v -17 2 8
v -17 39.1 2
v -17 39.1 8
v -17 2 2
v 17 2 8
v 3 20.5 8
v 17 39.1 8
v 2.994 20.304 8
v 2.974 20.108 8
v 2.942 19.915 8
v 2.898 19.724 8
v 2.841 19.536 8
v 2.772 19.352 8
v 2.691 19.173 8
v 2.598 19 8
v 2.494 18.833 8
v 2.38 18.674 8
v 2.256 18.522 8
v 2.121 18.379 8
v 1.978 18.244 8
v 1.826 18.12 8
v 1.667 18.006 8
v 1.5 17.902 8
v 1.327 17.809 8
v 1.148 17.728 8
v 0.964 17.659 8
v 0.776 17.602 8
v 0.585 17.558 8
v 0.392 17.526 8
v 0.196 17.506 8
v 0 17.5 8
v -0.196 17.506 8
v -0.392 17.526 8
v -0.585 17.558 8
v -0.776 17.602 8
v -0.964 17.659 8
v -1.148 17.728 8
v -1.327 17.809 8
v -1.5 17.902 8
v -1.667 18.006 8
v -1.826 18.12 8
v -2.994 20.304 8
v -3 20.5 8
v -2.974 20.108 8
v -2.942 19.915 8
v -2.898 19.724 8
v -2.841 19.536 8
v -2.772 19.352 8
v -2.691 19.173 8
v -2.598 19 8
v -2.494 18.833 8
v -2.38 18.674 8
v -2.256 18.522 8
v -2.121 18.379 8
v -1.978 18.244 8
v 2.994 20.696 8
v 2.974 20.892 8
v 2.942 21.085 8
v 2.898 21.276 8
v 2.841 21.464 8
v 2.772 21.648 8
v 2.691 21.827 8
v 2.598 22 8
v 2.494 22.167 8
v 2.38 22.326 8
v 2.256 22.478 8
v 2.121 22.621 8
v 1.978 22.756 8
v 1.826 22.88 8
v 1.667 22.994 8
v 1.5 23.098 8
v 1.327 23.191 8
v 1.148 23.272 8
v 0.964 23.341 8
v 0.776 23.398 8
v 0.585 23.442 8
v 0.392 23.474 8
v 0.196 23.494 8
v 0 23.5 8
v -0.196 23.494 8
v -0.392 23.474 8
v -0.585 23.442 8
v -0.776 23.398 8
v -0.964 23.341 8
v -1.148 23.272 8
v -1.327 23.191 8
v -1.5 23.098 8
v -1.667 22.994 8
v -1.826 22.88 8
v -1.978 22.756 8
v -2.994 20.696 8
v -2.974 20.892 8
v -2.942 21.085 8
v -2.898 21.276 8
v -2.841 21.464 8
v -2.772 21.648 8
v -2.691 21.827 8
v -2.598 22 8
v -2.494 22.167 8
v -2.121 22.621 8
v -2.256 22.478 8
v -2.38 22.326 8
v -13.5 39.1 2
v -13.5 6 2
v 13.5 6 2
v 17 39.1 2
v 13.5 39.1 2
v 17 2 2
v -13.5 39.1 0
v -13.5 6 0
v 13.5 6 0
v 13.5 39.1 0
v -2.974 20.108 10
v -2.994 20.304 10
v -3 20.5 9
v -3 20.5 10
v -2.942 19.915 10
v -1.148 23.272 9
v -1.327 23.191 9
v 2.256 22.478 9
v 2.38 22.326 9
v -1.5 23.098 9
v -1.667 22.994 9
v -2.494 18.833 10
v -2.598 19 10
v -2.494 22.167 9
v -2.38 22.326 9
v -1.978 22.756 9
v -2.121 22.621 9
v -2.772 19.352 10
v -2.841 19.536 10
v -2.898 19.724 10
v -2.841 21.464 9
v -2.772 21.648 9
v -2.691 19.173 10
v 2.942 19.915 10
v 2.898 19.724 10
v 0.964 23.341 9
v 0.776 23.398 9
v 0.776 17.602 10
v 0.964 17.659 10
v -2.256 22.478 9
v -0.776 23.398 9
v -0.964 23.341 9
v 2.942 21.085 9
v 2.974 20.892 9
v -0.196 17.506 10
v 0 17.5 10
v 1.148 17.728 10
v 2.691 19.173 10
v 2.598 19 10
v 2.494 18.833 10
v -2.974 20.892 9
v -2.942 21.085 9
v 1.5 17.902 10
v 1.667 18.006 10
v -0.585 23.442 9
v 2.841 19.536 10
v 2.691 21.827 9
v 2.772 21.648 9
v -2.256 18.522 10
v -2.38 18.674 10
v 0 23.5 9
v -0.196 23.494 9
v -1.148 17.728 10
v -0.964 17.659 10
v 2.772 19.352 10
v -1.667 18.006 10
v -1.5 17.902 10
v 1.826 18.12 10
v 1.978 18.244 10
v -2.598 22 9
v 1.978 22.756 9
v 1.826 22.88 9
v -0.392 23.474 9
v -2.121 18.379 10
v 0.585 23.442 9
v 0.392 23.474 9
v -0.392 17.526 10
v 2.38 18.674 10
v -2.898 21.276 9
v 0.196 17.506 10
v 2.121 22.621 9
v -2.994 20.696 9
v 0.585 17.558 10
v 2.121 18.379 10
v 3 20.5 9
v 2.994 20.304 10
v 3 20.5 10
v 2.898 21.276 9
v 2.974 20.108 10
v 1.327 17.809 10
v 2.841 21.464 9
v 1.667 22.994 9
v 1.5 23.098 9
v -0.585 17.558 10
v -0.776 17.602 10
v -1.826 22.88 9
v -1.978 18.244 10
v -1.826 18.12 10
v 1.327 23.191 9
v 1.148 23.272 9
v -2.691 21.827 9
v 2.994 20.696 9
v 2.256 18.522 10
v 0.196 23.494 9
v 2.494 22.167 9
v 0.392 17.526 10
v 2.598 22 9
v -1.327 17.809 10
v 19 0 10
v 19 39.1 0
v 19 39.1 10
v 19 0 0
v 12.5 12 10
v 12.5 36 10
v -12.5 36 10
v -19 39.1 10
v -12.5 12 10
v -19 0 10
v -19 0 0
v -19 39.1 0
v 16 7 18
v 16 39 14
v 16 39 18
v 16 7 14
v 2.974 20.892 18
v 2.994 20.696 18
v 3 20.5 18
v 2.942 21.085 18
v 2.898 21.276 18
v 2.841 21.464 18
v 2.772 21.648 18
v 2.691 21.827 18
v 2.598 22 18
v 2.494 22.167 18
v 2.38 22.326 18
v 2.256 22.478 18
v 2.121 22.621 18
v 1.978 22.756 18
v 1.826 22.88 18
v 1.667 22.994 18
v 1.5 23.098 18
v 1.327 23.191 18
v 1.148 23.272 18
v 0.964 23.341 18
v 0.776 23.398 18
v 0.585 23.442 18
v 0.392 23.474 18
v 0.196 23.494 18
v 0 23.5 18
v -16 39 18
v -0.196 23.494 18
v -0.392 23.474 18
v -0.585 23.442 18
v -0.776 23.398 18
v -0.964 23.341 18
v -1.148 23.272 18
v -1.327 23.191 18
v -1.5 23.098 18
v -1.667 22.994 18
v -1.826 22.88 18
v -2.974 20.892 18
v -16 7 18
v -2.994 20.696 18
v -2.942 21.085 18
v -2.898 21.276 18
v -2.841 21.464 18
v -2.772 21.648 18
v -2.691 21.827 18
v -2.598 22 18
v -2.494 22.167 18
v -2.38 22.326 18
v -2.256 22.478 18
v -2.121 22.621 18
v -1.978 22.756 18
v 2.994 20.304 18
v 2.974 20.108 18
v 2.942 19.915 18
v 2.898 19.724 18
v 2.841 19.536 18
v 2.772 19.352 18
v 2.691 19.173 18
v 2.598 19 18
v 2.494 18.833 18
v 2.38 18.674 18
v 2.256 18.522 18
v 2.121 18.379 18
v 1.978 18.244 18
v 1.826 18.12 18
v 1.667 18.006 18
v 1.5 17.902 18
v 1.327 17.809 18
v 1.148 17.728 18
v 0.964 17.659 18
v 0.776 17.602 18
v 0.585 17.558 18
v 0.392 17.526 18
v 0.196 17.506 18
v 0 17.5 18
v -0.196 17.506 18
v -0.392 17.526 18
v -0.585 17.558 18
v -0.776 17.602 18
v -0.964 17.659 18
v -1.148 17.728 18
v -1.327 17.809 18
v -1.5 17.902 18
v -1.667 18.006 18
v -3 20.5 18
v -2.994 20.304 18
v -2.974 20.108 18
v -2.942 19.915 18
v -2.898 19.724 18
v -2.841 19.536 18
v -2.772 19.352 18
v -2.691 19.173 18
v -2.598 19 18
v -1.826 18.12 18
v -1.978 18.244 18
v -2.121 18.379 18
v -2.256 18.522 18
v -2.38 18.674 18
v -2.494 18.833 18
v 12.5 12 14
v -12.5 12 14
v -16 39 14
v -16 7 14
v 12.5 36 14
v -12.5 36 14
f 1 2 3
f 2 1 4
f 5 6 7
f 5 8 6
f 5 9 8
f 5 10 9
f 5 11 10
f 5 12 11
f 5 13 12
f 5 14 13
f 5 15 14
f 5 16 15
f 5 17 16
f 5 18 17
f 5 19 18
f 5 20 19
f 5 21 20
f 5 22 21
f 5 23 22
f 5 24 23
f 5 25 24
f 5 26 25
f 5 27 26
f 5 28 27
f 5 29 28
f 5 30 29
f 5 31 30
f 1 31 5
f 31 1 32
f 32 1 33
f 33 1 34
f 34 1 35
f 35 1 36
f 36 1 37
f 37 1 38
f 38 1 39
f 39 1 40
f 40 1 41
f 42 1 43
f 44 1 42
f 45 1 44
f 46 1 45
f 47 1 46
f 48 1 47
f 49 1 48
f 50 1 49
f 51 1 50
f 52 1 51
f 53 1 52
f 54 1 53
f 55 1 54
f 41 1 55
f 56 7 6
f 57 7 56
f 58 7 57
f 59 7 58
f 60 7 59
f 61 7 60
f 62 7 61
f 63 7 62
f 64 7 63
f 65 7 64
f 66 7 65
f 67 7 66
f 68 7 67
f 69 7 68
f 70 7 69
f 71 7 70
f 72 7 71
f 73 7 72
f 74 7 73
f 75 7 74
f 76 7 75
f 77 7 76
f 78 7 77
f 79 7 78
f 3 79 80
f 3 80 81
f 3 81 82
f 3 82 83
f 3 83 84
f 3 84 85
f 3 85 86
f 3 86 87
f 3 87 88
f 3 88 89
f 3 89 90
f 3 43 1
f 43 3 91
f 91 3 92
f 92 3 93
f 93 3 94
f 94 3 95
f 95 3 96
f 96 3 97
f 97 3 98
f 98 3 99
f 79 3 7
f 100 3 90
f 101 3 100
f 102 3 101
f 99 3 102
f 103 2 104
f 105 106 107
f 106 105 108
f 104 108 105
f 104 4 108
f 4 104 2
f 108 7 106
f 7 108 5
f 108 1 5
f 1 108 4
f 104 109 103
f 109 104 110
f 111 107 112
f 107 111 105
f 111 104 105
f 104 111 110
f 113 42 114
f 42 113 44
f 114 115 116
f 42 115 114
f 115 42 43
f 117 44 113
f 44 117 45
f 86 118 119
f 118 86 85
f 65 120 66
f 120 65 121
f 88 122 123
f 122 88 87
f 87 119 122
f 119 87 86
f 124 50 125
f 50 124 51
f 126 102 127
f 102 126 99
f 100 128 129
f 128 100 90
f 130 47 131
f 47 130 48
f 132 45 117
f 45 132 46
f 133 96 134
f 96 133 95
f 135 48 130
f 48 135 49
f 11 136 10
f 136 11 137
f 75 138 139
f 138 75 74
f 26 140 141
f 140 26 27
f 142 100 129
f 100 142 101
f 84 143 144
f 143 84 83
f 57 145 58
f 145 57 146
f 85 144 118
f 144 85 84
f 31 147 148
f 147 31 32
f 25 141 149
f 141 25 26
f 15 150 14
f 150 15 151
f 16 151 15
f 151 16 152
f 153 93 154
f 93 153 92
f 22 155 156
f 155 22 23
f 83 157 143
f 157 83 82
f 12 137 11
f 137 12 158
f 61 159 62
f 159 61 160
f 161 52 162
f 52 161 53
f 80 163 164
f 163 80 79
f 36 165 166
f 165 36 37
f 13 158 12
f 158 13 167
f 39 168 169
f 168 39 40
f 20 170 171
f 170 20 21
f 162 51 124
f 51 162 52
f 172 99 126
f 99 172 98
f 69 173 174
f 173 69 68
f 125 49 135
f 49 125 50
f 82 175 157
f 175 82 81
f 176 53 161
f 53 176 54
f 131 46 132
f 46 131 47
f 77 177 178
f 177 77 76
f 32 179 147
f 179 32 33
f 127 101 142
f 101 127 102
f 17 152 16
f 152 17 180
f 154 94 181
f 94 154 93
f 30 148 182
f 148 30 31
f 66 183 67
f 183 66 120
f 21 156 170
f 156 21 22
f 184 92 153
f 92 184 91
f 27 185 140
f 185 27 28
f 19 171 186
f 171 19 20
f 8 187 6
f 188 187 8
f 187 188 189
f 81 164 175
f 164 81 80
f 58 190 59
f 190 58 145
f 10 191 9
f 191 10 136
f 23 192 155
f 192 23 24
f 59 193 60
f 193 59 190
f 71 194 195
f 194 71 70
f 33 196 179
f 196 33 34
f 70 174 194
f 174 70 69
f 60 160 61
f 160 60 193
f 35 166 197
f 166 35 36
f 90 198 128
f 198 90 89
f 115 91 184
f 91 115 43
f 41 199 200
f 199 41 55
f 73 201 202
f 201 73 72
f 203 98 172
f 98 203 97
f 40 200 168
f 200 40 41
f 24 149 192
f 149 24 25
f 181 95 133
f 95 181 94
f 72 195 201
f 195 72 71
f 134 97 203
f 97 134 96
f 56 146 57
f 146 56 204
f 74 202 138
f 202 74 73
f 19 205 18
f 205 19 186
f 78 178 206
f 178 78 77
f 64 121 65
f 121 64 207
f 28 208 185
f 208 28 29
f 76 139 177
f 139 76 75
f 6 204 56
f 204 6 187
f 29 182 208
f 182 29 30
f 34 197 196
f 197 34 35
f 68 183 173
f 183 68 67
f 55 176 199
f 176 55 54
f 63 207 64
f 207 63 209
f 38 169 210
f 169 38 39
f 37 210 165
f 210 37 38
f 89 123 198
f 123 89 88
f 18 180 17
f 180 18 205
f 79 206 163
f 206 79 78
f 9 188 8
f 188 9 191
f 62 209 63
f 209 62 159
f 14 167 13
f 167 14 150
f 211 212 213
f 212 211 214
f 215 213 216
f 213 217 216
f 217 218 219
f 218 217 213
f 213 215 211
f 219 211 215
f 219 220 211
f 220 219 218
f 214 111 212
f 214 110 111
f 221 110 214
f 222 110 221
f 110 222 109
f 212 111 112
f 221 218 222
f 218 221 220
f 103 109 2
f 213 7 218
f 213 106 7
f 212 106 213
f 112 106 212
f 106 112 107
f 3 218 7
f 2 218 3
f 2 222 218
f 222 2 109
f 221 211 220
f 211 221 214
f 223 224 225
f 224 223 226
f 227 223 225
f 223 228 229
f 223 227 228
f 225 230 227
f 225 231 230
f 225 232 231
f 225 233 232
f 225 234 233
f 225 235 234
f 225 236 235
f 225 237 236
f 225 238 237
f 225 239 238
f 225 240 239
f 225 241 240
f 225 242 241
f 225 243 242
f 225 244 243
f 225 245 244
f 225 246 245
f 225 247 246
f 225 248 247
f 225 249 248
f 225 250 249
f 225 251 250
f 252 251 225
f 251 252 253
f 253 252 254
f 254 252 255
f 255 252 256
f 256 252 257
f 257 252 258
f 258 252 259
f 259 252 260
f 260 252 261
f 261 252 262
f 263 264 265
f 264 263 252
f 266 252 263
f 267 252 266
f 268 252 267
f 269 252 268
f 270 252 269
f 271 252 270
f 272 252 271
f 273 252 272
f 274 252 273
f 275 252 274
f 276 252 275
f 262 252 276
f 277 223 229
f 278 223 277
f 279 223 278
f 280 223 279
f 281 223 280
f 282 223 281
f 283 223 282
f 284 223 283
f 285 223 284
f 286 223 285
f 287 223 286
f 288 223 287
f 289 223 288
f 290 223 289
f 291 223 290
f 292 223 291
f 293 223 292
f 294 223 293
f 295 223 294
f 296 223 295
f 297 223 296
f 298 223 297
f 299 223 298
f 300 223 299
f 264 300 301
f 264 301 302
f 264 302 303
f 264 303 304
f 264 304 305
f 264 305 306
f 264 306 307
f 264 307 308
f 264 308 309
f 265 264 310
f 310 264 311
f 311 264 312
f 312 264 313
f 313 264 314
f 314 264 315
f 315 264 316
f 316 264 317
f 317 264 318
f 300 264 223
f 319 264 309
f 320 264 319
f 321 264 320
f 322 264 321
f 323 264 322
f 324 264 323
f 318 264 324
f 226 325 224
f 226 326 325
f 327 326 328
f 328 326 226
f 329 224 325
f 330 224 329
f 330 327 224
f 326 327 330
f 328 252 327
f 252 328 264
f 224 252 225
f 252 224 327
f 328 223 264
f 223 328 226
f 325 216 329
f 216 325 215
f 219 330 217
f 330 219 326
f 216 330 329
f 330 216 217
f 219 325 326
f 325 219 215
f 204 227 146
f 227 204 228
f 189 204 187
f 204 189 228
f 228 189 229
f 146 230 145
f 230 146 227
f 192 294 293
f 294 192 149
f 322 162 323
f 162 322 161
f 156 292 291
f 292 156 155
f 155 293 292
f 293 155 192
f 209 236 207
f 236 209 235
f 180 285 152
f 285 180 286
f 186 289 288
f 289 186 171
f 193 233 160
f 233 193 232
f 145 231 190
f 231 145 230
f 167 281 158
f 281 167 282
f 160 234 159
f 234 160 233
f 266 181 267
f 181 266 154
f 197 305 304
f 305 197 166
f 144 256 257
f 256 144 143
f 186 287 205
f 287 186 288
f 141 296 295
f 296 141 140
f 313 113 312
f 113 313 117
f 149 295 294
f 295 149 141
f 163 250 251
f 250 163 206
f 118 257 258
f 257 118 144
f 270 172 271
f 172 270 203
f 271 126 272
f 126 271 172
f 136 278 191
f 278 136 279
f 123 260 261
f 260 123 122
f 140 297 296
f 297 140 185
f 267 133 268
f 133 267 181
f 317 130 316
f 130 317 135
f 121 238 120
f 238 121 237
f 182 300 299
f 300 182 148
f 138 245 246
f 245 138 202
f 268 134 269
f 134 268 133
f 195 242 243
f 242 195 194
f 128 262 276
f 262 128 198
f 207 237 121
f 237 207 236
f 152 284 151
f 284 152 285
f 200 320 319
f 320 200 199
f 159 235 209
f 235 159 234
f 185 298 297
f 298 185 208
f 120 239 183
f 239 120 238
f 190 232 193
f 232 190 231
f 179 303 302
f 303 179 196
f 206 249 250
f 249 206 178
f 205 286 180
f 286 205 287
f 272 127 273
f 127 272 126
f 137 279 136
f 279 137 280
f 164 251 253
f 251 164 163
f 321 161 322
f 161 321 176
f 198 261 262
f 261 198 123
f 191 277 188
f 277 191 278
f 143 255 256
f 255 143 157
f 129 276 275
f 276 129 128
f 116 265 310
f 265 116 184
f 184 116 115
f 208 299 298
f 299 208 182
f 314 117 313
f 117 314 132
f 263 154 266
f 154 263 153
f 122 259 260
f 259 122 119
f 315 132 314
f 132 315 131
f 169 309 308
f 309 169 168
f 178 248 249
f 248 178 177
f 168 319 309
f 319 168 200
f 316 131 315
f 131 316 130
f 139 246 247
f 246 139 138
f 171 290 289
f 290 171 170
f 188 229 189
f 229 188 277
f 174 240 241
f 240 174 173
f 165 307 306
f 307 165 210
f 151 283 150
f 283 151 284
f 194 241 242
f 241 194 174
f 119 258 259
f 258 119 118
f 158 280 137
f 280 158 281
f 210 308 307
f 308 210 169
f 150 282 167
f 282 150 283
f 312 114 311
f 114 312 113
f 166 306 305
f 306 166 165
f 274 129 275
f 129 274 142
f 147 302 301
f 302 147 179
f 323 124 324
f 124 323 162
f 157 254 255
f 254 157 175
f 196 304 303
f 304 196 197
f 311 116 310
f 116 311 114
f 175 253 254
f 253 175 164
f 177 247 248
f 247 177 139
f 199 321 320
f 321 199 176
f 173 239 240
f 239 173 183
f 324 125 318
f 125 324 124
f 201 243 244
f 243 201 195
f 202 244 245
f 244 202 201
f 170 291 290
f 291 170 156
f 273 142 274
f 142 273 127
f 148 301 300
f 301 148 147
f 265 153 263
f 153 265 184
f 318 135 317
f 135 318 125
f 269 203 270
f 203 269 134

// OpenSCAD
difference(){
translate([-19,0,0]) color("blue") cube([38,39.1,10]);
rotate([0,0,180]) translate([0,-40,-1]) color("green") frein_hollow();
}
translate([0,7,9]) color("red") frein();

module frein(){
	difference(){
		union(){
			translate([-16,0,5]) cube([32,32,4]);
			translate([-12.5,5,0]) cube([25,24,5]);
		}
		translate([0,13.5,0]) cylinder (r=3, h=10, $fn=96);
	}
}

module frein_hollow(){
	translate([-17,0,3]) cube([34,38,6]);
	translate([-13.5,0,0]) cube([27,34,3]);
	translate([0,19.5,0]) cylinder (r=3, h=15, $fn=96);
}
